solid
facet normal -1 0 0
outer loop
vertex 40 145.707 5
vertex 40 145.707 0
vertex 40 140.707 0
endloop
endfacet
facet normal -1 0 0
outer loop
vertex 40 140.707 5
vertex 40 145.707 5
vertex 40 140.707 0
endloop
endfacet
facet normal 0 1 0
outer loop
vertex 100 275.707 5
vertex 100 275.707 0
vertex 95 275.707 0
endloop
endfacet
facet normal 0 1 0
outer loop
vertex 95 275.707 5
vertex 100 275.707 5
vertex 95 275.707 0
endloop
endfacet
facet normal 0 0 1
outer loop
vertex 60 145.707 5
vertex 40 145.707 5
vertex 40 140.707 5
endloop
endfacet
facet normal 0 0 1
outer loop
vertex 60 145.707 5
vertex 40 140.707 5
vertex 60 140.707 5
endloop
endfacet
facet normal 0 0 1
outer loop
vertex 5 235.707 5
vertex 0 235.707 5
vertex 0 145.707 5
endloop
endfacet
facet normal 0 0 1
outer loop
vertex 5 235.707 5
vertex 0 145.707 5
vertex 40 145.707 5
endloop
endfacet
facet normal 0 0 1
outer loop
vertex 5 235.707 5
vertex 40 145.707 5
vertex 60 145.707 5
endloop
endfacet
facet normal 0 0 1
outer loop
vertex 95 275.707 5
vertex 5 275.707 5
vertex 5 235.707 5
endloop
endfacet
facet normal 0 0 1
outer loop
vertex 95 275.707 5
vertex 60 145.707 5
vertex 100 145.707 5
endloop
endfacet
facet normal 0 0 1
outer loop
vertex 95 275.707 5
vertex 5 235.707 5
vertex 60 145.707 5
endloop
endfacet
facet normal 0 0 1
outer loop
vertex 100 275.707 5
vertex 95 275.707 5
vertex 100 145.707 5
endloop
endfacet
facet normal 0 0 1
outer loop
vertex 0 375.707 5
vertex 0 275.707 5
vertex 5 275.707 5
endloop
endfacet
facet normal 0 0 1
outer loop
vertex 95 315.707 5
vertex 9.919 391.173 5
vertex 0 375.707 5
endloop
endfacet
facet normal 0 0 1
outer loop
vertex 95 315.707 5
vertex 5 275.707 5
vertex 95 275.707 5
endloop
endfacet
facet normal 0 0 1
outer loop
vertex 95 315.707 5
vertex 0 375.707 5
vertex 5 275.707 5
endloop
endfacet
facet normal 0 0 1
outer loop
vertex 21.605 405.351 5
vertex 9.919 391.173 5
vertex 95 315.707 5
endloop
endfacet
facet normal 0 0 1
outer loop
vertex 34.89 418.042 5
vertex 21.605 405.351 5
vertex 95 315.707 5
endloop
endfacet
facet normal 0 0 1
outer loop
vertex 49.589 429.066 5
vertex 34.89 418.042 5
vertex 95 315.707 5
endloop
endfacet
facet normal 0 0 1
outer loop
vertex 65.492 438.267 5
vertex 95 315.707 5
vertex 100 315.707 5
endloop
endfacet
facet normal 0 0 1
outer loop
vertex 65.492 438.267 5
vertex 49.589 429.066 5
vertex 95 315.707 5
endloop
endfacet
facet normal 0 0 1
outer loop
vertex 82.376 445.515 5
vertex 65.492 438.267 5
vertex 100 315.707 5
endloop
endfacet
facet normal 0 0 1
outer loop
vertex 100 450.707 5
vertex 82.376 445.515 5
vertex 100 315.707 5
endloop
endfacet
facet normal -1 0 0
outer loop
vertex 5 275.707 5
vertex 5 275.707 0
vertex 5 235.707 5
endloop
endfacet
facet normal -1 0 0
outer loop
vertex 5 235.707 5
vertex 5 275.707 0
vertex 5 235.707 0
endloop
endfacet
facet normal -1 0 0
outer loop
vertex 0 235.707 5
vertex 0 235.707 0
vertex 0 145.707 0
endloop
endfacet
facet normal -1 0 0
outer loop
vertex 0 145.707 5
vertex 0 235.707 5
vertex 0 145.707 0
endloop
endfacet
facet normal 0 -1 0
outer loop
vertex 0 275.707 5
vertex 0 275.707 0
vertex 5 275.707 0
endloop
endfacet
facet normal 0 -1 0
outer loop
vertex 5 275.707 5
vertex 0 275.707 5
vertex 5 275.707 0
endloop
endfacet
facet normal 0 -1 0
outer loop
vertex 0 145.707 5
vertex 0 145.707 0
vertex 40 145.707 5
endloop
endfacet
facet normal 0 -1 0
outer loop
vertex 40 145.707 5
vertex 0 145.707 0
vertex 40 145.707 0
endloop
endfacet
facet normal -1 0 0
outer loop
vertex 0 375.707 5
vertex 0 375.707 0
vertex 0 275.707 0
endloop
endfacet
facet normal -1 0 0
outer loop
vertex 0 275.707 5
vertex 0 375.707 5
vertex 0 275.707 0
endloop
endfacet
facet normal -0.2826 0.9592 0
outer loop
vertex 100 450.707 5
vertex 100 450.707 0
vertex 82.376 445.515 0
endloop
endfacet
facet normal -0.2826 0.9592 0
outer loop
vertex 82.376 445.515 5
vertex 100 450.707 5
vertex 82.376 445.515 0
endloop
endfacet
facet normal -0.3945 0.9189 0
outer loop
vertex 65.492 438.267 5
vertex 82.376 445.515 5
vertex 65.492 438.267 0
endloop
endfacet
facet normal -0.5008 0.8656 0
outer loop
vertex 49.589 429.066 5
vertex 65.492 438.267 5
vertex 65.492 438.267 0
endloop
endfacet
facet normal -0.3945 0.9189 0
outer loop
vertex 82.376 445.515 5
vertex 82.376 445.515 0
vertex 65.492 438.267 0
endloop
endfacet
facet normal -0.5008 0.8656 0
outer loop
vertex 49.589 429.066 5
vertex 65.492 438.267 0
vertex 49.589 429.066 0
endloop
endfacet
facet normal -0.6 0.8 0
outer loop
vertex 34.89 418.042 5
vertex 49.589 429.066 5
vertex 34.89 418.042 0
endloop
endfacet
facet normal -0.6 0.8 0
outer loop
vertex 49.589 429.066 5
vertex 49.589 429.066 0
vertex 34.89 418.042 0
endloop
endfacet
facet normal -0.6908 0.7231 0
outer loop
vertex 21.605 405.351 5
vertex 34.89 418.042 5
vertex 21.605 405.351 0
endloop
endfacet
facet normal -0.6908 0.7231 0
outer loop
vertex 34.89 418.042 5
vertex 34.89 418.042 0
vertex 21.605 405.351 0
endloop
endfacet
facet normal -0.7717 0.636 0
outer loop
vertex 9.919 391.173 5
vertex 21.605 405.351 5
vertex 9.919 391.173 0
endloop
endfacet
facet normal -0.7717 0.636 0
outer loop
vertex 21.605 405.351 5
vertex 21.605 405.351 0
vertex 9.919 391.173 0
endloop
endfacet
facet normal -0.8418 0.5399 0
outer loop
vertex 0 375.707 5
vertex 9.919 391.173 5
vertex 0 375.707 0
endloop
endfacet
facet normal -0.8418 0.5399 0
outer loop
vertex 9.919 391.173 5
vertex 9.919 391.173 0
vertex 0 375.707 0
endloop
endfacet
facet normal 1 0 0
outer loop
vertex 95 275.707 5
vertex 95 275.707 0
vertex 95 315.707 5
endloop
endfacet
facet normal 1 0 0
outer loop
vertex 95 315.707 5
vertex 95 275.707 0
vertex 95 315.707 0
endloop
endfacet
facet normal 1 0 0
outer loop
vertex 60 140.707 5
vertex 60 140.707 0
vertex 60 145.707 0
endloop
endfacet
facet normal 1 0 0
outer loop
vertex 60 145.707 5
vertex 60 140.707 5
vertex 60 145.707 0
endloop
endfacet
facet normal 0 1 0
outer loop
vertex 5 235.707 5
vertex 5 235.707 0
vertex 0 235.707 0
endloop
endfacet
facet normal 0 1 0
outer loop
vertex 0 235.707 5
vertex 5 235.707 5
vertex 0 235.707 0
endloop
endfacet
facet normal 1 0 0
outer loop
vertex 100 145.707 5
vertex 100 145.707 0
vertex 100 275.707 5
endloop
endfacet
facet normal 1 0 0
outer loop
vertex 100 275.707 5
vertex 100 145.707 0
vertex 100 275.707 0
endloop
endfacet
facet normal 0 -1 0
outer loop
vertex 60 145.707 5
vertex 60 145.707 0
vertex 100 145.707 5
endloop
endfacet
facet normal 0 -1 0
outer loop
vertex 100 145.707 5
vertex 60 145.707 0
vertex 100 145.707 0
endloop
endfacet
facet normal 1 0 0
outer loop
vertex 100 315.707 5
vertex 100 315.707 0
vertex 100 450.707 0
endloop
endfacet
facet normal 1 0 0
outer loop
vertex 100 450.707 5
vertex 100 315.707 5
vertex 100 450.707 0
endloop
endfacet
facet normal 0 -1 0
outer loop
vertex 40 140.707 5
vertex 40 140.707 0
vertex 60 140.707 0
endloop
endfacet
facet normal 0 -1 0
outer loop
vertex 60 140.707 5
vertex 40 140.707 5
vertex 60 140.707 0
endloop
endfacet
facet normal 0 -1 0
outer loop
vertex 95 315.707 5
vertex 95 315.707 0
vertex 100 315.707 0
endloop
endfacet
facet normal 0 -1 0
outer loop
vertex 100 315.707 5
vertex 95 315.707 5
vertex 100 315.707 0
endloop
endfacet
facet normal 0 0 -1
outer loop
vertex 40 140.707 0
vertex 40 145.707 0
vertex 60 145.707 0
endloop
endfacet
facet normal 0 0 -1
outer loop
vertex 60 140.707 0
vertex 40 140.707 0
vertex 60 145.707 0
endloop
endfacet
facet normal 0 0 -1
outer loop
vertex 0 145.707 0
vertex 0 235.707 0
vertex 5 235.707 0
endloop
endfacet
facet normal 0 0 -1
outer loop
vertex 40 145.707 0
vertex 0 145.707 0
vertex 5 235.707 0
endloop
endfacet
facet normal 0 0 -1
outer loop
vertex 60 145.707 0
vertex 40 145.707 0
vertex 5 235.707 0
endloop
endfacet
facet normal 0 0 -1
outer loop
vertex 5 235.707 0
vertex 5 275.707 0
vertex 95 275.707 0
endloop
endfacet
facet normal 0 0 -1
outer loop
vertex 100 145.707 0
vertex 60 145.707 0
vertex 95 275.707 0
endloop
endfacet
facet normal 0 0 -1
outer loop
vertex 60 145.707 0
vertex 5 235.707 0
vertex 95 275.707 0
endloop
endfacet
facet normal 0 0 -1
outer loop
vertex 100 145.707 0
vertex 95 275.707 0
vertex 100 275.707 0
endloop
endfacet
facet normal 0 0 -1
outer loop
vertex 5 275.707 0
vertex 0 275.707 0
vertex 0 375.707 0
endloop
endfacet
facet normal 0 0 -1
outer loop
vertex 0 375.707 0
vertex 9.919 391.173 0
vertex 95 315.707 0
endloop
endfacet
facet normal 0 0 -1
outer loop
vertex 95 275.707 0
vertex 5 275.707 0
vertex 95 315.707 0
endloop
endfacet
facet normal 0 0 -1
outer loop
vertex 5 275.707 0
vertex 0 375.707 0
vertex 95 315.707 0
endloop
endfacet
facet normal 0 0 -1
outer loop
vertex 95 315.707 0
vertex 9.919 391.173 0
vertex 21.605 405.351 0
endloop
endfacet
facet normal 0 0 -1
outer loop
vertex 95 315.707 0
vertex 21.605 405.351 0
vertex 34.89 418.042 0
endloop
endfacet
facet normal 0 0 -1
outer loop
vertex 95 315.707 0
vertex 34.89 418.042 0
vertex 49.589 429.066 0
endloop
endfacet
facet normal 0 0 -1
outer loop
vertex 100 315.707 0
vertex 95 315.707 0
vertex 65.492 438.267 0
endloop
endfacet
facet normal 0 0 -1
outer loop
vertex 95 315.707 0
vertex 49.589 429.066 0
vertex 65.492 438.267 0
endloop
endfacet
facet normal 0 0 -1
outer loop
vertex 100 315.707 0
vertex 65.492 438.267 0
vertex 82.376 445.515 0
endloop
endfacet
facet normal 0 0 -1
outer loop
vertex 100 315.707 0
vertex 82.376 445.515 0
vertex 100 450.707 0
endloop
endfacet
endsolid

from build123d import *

# Parameters (mm, degrees)
BOSS_EXTRU_1_DEPTH = 5


with BuildPart() as part:
    # Esquisse1 → Boss.-Extru.1 (new body)
    with BuildSketch(Plane.XY):
        with BuildLine():
            Line((100, 145.707319285), (100, 240.707319285))
            Line((100, 240.707319285), (100, 275.707319285))
            Line((100, 275.707319285), (95, 275.707319285))
            Line((95, 275.707319285), (95, 315.707319285))
            Line((95, 315.707319285), (100, 315.707319285))
            Line((100, 315.707319285), (100, 450.707319285))
            ThreePointArc((100, 450.707319285), (42.075716698, 423.773030355), (0, 375.707319285))
            Line((0, 375.707319285), (0, 275.707319285))
            Line((0, 275.707319285), (5, 275.707319285))
            Line((5, 275.707319285), (5, 235.707319285))
            Line((5, 235.707319285), (0, 235.707319285))
            Line((0, 235.707319285), (0, 145.707319285))
            Line((0, 145.707319285), (40, 145.707319285))
            Line((40, 145.707319285), (40, 140.707319285))
            Line((40, 140.707319285), (60, 140.707319285))
            Line((60, 140.707319285), (60, 145.707319285))
            Line((60, 145.707319285), (100, 145.707319285))
        make_face()
    extrude(amount=BOSS_EXTRU_1_DEPTH)


solid = part.part
